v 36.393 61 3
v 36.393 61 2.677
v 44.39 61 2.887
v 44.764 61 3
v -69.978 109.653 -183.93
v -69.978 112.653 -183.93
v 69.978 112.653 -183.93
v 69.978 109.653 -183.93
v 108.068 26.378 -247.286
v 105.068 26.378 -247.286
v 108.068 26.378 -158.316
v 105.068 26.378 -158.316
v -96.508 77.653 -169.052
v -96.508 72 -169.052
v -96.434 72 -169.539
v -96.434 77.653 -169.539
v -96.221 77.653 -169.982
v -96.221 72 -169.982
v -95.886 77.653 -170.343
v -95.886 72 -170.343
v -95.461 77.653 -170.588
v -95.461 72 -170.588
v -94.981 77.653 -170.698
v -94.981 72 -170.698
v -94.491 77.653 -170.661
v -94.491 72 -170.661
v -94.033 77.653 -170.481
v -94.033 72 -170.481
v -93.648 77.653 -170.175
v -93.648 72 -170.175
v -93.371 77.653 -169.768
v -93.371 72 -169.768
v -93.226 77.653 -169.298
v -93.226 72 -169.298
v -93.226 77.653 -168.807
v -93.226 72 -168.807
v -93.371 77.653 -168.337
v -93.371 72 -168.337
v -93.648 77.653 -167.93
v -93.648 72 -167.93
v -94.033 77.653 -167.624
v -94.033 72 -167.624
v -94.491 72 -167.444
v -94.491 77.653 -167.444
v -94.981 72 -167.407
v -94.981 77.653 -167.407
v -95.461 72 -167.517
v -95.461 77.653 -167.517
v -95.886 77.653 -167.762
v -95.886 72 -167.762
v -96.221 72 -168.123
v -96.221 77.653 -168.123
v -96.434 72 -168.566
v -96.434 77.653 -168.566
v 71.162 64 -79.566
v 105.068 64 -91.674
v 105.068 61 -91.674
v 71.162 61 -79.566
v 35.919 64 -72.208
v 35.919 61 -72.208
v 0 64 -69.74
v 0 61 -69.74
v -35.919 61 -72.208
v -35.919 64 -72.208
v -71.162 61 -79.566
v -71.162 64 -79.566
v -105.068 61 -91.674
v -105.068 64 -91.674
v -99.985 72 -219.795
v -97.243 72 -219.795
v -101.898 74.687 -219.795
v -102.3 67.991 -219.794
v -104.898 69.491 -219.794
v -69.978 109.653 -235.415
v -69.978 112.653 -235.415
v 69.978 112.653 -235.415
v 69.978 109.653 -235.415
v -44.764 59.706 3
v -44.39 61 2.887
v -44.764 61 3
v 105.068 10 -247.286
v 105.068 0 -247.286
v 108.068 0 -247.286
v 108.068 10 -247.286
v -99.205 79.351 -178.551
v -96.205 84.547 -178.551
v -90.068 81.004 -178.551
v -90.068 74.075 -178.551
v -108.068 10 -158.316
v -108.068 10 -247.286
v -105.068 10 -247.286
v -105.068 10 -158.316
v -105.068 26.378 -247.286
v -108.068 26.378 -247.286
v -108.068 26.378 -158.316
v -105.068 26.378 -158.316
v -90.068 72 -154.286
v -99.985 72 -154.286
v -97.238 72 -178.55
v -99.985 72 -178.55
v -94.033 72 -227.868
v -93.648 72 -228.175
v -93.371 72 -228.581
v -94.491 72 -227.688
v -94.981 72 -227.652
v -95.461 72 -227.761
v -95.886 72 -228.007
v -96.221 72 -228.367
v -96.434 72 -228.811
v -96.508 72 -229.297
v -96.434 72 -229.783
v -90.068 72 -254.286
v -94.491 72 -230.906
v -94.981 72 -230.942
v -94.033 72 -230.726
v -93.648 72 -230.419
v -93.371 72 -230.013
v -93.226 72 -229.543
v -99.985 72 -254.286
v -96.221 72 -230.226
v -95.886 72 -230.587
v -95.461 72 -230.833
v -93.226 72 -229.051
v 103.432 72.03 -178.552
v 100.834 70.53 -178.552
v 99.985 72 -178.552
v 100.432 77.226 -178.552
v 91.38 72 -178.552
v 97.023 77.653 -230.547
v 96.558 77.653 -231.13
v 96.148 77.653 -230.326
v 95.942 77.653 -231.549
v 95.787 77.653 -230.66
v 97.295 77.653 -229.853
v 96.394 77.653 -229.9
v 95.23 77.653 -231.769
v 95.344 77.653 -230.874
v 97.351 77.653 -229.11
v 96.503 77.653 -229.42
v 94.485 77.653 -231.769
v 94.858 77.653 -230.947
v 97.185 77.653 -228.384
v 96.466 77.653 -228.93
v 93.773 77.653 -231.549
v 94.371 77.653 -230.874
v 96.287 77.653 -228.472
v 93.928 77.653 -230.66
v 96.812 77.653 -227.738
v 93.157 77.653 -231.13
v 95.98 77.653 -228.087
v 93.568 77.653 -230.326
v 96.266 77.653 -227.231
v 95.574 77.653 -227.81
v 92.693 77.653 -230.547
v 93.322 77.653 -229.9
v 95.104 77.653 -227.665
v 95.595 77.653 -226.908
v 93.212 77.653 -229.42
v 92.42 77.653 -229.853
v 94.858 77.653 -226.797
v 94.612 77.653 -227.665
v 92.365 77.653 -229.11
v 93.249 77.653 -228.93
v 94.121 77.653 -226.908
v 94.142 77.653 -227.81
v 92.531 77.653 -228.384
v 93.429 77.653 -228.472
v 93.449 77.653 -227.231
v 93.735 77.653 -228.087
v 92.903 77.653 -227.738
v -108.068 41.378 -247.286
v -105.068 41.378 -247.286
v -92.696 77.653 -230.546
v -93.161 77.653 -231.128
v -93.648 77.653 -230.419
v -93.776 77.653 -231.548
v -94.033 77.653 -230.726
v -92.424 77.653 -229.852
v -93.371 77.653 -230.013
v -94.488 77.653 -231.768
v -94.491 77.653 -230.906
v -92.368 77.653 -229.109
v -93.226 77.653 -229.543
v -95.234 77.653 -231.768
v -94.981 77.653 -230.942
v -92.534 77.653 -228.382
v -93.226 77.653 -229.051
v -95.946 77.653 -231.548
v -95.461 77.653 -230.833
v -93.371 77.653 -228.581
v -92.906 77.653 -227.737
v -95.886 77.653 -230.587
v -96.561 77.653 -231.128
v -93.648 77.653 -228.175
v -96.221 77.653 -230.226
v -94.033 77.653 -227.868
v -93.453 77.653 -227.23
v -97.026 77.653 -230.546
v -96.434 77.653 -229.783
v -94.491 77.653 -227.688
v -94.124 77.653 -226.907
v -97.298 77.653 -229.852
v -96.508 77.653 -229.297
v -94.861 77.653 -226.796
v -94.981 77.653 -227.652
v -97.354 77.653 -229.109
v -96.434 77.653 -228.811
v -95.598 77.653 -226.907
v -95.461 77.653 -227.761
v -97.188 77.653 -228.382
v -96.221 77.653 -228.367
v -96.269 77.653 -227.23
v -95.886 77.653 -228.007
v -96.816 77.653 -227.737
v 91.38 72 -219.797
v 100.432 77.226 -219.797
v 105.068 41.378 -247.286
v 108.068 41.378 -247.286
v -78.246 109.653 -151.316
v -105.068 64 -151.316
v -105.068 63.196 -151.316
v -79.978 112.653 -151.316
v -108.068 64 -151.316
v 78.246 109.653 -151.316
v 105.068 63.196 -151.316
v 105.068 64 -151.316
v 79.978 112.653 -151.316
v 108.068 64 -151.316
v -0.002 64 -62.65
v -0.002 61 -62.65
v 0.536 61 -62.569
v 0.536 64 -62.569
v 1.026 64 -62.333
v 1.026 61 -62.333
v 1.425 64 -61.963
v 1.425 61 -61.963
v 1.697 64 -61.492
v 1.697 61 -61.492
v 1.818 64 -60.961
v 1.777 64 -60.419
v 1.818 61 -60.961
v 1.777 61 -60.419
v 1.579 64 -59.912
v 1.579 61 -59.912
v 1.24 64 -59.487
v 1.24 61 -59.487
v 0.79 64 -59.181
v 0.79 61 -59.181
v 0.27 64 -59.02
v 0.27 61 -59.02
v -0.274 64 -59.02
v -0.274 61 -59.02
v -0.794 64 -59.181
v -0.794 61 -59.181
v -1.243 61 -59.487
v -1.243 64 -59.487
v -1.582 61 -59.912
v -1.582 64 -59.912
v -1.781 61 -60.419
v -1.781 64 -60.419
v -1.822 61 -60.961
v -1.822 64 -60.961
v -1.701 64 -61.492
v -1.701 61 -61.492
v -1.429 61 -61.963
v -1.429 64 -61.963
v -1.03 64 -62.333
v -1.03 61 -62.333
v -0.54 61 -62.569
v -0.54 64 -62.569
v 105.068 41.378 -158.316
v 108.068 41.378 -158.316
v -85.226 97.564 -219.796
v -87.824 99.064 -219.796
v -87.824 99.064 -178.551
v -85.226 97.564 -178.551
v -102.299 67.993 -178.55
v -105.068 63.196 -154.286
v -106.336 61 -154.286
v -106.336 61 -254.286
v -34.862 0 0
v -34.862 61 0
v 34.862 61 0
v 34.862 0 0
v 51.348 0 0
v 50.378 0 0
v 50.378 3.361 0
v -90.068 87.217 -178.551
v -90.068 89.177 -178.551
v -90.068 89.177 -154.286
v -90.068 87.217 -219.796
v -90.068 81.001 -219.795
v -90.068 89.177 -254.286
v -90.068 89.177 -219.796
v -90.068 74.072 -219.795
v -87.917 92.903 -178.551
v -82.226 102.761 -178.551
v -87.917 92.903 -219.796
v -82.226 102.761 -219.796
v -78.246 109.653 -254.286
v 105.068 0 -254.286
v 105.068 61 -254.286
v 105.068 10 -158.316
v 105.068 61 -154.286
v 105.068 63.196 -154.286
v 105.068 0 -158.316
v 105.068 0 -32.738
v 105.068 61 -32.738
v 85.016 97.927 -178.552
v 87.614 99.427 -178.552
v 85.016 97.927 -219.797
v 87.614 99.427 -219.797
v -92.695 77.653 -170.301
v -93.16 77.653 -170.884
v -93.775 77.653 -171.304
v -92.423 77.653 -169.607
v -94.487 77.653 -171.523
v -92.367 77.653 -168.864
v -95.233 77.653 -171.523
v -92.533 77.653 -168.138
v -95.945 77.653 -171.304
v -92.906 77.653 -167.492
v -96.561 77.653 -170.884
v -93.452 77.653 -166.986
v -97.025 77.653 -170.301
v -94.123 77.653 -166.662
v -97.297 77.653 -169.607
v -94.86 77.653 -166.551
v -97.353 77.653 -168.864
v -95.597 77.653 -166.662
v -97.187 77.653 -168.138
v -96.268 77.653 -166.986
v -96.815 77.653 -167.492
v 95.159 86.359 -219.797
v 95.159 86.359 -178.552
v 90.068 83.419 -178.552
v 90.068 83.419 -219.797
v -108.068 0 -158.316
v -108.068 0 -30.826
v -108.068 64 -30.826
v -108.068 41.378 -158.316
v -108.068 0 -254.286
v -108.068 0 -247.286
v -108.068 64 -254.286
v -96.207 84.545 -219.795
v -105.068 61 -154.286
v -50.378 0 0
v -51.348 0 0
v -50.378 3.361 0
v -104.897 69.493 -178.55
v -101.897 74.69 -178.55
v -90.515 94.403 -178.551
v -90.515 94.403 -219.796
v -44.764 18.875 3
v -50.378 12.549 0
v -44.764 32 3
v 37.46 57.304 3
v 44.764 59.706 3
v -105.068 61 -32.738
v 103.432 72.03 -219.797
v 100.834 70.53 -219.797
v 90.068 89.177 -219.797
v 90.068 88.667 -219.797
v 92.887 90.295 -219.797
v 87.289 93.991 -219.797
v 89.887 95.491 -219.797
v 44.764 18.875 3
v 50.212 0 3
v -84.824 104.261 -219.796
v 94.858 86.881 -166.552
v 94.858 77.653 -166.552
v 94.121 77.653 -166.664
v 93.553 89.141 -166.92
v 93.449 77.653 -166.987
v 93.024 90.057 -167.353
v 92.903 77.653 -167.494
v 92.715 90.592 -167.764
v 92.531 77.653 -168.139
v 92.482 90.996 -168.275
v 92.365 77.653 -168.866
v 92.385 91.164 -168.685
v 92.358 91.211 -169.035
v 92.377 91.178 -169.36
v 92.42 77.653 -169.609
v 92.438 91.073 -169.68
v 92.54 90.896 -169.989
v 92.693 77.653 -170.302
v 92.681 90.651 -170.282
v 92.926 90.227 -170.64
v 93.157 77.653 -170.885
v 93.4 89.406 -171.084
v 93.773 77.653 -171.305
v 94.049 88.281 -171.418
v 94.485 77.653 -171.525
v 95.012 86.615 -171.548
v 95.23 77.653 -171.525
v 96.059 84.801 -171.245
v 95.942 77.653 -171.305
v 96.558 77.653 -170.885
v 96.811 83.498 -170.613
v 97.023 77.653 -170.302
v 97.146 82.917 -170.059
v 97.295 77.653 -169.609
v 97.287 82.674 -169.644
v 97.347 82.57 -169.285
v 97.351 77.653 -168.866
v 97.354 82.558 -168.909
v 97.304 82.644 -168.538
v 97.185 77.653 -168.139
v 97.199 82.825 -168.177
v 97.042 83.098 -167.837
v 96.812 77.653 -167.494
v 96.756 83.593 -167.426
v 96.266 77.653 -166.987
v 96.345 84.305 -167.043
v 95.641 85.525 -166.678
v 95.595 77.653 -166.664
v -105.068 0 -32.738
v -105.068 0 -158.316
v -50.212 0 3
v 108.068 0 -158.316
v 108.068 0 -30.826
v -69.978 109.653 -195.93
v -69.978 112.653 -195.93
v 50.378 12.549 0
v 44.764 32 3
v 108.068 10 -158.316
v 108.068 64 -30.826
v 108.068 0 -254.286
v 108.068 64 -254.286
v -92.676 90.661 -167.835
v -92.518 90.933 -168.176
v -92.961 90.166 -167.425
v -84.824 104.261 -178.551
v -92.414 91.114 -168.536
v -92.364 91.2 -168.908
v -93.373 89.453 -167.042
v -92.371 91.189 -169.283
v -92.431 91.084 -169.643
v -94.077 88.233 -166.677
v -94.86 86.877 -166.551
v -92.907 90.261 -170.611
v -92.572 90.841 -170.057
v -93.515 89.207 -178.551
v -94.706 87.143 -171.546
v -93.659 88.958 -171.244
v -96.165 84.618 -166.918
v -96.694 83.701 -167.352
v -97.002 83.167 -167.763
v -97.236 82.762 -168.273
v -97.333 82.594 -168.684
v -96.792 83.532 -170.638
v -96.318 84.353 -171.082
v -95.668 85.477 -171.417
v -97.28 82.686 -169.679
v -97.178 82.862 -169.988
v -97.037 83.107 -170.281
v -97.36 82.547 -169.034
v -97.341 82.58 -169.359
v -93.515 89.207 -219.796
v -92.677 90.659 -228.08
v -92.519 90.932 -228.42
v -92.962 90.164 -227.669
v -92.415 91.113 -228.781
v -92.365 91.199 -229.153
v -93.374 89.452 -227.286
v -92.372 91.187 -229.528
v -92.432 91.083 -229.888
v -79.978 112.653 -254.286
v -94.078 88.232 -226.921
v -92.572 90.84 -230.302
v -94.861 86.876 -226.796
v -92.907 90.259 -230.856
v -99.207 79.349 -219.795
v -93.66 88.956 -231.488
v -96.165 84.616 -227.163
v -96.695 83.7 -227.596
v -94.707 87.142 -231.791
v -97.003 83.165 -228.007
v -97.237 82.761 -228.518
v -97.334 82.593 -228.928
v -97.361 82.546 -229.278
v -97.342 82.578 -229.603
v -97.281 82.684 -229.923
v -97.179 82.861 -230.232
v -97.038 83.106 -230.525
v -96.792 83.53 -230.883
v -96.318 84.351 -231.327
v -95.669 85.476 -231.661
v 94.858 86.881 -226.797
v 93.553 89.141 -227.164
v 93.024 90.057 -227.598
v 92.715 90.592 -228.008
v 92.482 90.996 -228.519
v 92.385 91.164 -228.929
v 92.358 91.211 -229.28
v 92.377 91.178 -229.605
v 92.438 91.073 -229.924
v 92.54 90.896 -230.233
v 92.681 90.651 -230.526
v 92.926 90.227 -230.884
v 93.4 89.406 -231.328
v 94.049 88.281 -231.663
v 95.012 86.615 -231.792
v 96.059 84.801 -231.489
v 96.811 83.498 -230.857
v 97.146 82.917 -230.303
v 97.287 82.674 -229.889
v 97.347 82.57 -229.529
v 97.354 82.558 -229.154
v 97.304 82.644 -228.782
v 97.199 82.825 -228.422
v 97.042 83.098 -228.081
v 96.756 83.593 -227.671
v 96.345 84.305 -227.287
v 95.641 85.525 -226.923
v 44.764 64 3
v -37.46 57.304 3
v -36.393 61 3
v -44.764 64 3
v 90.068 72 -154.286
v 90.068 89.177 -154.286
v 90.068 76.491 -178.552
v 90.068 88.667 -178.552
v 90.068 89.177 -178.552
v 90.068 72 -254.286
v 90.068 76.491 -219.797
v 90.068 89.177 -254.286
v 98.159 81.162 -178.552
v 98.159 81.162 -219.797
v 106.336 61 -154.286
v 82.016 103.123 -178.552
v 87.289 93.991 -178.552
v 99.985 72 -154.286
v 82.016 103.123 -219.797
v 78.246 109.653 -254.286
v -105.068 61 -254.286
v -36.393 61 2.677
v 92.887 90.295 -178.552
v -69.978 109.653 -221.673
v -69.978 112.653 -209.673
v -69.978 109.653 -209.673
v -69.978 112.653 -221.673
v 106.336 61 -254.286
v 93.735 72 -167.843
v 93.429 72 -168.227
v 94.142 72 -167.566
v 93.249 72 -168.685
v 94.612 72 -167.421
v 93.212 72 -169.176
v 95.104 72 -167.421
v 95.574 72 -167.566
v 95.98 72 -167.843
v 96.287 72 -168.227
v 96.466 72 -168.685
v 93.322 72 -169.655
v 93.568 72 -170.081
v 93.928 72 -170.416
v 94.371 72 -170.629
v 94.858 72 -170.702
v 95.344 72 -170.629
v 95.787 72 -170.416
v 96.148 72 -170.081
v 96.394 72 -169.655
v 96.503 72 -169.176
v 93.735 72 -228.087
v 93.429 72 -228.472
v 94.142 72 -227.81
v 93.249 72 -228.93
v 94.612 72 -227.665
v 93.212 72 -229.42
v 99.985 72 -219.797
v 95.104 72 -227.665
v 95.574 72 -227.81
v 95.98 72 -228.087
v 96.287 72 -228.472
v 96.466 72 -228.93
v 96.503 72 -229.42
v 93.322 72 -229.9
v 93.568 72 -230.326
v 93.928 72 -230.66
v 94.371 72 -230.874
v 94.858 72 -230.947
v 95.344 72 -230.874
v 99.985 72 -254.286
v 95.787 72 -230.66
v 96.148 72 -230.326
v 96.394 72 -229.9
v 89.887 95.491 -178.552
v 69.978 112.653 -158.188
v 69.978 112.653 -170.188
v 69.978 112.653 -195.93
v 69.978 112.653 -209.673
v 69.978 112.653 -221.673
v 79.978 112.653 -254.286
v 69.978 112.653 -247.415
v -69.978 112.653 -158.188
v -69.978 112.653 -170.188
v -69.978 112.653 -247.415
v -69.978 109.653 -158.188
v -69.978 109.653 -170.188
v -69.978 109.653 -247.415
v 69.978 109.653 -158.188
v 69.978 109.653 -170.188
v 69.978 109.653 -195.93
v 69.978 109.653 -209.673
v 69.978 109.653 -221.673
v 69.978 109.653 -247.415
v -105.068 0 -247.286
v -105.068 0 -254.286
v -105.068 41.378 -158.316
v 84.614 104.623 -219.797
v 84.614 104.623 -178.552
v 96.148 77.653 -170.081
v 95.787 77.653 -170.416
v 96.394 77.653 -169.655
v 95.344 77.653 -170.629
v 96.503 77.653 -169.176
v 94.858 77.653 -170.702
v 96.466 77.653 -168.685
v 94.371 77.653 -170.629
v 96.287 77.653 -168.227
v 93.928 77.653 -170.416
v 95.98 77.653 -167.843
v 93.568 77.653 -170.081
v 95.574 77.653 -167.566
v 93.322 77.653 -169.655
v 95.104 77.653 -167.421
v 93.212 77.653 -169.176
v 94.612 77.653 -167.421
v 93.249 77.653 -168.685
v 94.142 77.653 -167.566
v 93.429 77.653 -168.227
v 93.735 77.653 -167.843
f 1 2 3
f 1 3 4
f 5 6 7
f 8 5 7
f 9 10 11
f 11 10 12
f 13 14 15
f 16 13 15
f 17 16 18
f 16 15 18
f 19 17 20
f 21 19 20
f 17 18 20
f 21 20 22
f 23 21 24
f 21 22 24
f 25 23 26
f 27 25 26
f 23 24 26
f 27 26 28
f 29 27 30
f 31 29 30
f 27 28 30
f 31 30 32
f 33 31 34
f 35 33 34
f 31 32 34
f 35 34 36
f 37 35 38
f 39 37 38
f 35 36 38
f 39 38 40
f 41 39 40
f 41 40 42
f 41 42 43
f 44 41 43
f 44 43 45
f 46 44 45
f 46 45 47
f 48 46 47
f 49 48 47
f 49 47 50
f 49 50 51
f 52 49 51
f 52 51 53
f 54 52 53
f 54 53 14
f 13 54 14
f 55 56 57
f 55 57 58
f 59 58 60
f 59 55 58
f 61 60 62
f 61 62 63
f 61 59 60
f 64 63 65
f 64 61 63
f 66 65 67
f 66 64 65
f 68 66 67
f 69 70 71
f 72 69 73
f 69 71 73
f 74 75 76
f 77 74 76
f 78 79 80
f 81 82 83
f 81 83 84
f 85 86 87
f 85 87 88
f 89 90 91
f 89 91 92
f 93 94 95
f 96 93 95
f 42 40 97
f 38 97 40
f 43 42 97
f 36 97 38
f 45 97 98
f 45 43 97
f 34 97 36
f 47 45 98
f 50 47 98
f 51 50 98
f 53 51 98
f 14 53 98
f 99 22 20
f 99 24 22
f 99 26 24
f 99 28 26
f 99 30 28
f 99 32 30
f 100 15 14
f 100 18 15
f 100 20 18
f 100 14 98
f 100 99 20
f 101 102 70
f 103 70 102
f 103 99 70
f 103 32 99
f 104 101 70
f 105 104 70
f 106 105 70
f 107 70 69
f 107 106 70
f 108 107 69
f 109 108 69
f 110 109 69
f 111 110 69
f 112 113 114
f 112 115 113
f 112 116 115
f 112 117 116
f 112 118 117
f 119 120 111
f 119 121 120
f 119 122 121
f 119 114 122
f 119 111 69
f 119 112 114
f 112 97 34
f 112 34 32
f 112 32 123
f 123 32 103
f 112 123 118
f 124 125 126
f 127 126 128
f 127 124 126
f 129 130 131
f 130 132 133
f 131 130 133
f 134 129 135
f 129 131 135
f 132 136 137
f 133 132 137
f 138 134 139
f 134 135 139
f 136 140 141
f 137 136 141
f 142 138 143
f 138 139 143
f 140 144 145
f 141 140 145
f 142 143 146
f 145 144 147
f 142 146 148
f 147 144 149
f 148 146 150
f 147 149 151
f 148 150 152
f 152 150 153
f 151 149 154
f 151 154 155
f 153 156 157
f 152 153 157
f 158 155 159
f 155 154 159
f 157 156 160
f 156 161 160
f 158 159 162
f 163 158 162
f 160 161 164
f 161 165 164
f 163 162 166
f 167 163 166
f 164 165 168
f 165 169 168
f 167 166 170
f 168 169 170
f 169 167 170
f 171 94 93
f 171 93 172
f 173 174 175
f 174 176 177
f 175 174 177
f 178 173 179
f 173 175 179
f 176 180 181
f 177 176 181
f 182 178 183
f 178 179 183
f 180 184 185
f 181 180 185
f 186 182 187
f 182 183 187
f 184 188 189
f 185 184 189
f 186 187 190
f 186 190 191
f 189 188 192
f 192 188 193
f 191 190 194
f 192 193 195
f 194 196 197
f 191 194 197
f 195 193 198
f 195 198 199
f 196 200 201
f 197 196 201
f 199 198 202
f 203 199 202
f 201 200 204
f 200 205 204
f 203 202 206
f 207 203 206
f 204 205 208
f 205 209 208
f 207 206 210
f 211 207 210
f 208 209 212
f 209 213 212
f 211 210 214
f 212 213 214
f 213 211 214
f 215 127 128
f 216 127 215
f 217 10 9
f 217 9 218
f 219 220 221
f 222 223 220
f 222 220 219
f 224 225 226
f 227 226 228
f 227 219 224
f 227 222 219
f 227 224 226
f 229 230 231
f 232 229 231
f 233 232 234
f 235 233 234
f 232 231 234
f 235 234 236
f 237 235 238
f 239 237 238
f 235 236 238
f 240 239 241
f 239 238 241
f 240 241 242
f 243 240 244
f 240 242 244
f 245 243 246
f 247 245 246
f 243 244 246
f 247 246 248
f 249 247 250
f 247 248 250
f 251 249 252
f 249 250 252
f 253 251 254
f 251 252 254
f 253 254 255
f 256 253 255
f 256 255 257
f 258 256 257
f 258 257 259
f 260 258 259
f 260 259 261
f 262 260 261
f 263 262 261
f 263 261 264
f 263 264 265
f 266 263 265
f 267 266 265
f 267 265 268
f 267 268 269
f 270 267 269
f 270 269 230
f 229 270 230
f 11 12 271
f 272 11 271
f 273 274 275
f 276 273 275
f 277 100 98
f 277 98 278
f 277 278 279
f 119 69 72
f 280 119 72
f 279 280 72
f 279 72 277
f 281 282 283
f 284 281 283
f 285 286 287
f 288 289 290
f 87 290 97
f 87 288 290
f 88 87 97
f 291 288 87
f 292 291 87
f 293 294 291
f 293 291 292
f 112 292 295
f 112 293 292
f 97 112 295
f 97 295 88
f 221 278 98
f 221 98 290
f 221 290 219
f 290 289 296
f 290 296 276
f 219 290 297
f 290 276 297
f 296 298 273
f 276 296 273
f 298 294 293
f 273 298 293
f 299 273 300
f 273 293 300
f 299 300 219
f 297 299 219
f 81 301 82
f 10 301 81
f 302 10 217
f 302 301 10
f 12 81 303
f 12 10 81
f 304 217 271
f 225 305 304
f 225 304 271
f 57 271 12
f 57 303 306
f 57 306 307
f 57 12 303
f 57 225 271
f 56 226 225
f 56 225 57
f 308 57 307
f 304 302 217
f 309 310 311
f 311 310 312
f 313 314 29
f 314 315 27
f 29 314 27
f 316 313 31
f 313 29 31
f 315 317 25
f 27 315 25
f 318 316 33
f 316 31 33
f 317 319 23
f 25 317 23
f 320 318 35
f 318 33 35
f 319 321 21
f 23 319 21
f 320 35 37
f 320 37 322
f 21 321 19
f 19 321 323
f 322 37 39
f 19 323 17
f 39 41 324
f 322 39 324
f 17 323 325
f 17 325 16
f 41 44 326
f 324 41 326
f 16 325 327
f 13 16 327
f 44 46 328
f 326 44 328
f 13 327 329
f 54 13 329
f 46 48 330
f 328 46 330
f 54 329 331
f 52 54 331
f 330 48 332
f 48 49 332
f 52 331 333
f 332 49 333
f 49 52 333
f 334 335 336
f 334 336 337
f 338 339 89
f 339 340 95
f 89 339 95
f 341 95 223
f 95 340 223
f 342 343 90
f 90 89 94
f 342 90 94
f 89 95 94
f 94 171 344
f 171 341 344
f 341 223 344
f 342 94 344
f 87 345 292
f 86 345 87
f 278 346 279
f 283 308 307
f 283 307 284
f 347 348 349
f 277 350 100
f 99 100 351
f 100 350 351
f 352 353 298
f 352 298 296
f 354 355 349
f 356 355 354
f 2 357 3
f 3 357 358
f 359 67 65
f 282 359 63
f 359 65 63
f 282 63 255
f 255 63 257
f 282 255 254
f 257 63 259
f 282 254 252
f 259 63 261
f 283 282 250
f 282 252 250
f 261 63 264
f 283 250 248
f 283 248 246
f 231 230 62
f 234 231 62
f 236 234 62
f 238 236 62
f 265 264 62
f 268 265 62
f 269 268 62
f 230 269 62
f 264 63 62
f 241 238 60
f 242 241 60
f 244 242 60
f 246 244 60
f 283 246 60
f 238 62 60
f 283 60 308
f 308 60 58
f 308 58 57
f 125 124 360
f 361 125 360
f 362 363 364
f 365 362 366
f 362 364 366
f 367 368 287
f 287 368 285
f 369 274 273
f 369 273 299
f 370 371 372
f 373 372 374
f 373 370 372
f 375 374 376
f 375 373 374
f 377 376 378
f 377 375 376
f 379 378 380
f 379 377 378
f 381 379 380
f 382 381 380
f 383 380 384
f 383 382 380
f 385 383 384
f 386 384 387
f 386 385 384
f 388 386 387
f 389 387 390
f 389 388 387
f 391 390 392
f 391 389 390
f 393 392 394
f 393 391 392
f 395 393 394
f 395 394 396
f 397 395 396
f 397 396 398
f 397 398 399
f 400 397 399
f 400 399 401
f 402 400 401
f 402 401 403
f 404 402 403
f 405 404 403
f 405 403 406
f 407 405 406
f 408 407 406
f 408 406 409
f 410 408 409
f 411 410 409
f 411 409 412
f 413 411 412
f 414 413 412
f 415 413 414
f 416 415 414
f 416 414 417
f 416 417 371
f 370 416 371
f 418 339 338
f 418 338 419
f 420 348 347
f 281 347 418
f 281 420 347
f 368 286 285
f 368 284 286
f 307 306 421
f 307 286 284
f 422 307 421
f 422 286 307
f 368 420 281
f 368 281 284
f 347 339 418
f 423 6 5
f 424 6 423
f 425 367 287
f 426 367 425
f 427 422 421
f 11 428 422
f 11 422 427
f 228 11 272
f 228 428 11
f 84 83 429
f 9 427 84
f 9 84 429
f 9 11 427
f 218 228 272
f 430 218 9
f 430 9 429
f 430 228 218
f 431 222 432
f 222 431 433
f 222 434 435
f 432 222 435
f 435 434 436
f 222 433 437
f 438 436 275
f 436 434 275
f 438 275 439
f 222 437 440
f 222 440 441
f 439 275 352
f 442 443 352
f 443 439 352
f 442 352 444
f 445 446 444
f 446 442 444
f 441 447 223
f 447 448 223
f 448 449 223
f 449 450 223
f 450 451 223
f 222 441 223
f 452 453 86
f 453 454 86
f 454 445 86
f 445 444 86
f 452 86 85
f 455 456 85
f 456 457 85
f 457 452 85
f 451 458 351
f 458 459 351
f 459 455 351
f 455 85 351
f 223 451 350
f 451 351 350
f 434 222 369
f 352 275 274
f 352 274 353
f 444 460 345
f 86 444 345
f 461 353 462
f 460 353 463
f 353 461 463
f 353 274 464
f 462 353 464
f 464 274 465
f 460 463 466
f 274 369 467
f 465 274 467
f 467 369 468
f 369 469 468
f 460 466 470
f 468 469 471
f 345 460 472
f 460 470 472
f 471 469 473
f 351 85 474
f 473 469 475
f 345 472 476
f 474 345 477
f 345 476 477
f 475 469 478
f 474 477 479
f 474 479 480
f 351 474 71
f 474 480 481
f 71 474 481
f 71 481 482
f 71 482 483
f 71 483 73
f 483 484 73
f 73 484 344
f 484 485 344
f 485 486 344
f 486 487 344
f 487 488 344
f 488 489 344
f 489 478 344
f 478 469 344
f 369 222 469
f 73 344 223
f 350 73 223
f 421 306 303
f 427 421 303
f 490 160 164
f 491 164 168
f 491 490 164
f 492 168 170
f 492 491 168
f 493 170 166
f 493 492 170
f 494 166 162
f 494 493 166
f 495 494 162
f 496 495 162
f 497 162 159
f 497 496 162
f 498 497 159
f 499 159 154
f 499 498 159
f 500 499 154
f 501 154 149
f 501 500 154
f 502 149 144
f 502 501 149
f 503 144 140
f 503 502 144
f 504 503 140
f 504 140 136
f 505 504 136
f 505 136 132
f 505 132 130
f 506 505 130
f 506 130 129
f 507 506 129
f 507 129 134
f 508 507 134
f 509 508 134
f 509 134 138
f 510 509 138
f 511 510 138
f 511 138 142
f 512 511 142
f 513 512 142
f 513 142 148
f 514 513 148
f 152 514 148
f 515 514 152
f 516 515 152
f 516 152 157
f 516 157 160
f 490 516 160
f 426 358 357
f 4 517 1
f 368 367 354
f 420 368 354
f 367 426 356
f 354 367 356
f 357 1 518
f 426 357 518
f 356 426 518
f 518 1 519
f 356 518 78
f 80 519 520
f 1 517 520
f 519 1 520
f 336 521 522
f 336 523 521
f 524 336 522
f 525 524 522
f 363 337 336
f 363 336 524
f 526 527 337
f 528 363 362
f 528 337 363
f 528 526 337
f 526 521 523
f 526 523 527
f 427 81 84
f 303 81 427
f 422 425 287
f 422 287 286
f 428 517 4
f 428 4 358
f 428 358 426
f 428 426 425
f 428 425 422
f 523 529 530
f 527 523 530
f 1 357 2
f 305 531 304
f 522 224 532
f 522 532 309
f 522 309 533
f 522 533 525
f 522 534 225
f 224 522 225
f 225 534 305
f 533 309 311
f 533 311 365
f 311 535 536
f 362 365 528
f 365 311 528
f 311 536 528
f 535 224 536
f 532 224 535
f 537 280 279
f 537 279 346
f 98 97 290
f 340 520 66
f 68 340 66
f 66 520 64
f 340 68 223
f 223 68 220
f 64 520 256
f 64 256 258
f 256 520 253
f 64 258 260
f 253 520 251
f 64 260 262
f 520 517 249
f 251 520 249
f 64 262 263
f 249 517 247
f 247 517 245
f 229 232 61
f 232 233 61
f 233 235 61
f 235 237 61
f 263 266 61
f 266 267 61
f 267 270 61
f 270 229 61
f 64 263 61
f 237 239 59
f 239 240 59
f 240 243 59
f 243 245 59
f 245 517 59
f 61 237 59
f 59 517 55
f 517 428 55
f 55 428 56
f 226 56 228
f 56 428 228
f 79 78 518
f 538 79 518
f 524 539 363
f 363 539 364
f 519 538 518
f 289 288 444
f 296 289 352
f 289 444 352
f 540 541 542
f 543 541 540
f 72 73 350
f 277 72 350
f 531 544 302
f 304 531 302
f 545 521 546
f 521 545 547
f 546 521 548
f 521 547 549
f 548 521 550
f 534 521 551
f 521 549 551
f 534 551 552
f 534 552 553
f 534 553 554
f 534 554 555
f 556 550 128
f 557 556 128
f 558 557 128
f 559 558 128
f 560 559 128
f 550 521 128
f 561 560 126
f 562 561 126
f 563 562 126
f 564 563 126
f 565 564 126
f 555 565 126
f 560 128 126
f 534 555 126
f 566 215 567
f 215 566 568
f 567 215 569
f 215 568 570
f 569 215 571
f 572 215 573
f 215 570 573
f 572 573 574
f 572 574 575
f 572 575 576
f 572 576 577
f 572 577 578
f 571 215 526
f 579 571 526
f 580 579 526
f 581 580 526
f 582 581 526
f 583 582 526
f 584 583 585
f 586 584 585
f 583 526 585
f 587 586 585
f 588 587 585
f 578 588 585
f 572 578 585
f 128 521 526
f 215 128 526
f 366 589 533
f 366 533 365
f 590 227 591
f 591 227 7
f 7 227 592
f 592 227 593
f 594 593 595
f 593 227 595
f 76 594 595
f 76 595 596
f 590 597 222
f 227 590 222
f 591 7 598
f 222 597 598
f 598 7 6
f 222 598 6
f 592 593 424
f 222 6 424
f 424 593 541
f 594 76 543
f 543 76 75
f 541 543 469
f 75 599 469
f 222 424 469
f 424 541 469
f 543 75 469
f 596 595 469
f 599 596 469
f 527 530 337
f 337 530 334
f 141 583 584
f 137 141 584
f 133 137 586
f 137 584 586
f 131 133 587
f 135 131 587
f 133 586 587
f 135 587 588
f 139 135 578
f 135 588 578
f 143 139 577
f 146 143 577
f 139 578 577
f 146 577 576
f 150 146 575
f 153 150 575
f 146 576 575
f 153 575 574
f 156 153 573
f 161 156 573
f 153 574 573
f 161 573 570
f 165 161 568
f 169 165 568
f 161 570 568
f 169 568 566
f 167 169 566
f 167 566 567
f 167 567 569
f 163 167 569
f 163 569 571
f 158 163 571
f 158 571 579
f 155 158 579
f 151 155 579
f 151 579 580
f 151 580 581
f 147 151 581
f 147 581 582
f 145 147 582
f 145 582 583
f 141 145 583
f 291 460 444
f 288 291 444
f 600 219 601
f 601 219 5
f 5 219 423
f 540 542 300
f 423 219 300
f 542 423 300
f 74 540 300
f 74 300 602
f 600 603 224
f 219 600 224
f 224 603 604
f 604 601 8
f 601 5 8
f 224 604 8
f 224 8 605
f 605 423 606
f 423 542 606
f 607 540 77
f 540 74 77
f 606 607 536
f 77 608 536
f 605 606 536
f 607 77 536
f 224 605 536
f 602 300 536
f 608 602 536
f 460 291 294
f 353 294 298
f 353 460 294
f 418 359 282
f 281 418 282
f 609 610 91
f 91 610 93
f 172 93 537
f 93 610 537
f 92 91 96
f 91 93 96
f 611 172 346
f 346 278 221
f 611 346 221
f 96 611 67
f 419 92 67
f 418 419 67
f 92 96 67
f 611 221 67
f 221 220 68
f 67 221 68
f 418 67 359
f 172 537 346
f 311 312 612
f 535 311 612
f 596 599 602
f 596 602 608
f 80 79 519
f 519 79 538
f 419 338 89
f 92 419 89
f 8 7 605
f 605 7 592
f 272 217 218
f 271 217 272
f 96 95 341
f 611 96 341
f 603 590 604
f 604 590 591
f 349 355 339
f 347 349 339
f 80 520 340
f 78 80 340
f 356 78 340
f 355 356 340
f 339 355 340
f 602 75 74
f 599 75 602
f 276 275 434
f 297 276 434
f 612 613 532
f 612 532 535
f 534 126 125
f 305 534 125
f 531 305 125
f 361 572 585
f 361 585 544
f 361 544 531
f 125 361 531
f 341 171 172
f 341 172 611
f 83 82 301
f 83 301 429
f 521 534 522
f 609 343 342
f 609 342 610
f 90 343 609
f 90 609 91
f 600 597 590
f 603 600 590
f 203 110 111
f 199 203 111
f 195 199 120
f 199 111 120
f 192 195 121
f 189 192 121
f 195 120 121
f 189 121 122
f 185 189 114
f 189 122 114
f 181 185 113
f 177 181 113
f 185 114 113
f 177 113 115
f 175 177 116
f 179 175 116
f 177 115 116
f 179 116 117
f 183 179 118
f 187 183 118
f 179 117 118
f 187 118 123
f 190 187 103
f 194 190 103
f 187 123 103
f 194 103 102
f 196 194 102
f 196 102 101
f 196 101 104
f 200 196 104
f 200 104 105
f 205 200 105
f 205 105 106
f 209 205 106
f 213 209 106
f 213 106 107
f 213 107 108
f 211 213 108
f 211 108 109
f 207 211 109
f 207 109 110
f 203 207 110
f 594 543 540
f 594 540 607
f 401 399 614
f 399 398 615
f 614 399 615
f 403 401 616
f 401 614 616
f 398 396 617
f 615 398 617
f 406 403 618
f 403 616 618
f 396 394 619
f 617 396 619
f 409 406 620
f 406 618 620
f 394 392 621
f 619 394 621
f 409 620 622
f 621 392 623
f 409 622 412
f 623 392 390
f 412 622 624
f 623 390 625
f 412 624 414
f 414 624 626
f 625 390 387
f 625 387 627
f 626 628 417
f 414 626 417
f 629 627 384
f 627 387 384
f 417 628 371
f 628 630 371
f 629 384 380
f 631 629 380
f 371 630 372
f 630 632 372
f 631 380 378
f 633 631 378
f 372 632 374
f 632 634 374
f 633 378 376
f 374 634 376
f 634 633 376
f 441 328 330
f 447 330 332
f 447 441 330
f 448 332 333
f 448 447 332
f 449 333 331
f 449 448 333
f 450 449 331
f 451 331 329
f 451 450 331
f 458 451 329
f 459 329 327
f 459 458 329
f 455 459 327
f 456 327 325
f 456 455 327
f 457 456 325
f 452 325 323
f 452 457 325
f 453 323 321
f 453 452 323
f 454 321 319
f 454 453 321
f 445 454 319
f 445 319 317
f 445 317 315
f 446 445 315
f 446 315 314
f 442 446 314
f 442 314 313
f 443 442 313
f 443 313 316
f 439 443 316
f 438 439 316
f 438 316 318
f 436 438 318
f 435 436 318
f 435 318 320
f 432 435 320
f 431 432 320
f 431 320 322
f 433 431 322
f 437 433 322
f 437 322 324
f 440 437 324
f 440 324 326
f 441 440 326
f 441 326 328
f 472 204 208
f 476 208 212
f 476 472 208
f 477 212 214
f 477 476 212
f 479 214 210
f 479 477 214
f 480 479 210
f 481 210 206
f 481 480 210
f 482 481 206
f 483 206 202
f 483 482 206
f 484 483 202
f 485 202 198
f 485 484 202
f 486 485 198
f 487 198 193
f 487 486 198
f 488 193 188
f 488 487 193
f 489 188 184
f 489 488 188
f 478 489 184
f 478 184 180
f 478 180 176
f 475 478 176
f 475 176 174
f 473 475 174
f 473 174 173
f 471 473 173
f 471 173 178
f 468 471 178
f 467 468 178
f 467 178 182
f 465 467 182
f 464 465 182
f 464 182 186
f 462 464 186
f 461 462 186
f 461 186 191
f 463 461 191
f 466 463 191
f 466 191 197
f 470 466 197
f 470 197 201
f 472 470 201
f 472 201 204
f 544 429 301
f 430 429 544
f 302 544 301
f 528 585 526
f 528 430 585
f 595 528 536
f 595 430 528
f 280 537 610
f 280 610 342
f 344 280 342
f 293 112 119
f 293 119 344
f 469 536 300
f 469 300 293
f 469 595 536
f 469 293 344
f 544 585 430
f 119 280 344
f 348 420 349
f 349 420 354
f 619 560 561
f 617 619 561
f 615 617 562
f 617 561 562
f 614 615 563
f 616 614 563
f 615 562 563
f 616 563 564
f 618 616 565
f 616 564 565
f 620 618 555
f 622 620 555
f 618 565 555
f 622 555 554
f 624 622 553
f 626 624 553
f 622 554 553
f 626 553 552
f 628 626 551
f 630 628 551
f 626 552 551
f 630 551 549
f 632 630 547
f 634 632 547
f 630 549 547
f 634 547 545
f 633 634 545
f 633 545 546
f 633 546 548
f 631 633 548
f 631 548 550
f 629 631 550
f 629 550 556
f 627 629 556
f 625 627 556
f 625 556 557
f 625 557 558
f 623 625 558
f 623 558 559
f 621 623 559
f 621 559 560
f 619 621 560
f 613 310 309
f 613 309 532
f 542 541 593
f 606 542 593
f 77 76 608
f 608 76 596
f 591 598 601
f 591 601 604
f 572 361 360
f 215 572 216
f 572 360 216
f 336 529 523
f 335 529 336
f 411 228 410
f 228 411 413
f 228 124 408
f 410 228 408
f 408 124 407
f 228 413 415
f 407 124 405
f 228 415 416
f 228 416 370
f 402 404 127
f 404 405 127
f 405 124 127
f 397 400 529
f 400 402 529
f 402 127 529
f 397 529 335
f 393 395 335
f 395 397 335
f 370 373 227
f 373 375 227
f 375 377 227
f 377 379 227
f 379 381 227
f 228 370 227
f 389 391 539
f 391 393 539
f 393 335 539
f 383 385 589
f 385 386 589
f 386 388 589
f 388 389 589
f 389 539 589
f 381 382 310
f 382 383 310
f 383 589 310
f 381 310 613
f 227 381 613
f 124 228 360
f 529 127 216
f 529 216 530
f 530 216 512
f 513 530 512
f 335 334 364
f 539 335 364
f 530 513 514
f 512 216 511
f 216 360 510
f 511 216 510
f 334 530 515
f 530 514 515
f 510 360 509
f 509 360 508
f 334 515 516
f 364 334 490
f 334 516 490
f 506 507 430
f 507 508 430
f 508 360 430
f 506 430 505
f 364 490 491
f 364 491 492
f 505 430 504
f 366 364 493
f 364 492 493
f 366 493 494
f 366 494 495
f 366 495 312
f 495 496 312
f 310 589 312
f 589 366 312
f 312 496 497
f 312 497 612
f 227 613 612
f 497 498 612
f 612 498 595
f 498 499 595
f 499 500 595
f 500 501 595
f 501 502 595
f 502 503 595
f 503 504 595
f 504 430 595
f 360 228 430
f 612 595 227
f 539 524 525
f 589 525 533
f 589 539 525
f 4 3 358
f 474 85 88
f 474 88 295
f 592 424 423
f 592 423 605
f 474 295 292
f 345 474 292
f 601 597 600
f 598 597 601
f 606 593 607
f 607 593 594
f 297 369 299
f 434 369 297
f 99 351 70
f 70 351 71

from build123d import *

# Parameters (mm, degrees)
SALIENTE_EXTRUIR15_DEPTH = 3
SALIENTE_EXTRUIR16_REACH = 85.791
CHAFL_N1_SIZE            = 8
CHAFL_N1_SIZE_2          = 2.205109306
CHAFL_N2_SIZE            = 2.205109306
CHAFL_N2_SIZE_2          = 8
SALIENTE_EXTRUIR17_DEPTH = 3
SALIENTE_EXTRUIR18_DEPTH = 102.97
CROQUIS28_R              = 1.825
CORTAR_EXTRUIR6_DEPTH    = 283.951050372
SALIENTE_EXTRUIR19_DEPTH = 100
CROQUIS30_R              = 1.65
CORTAR_EXTRUIR7_DEPTH    = 283.951050372
CORTAR_EXTRUIR9_REACH    = 302.941
CORTAR_EXTRUIR10_START   = -40.653307
CROQUIS34_R              = 2.5
CORTAR_EXTRUIR10_DEPTH   = 35
CROQUIS35_W              = 41.244426213
CROQUIS35_H              = 6
CORTAR_EXTRUIR11_DEPTH   = 17
CROQUIS36_W              = 41.244426207
CROQUIS36_H              = 6
CORTAR_EXTRUIR12_DEPTH   = 17
CROQUIS37_W              = 139.956448948
CROQUIS37_H              = 12
CORTAR_EXTRUIR13_DEPTH   = 3
CROQUIS39_W              = 88.97
CROQUIS39_H              = 15
CROQUIS39_H_2            = 10
CORTAR_EXTRUIR14_DEPTH   = 353.231866742
CHAFL_N4_SIZE            = 3.639702343
CHAFL_N4_SIZE_2          = 10


with BuildPart() as part:
    # Croquis22 → Saliente-Extruir15 (new body)
    with BuildSketch(Plane.XY):
        Polygon((-54, 0), (54, 0), (35.527349199, 64), (-35.527349199, 64), align=None)
    extrude(amount=SALIENTE_EXTRUIR15_DEPTH)

    # Saliente-Extruir16: up to this face of the body (flat: up to its plane)
    saliente_extruir16_end = Plane(part.part.faces().sort_by_distance((0, 0, 1.5))[0])
    # Croquis23 → Saliente-Extruir16 (add, up to the picked face)
    with BuildSketch(Plane(origin=(0, 64, 0), x_dir=(1, 0, 0), z_dir=(0, 1, 0)), mode=Mode.PRIVATE) as saliente_extruir16_sk1:
        Polygon((108.068224474, 30.82636567), (108.068224474, 254.28636567), (105.068224474, 254.28636567), (105.068224474, 32.737576452), (34.862265211, 0), (44.7636746, -3), align=None)
    saliente_extruir16_tool1 = split(extrude(saliente_extruir16_sk1.sketch, amount=-SALIENTE_EXTRUIR16_REACH, mode=Mode.PRIVATE), bisect_by=saliente_extruir16_end, keep=Keep.BOTH, mode=Mode.PRIVATE)
    # Croquis23 → Saliente-Extruir16 (add, up to the picked face)
    with BuildSketch(Plane(origin=(0, 64, 0), x_dir=(1, 0, 0), z_dir=(0, 1, 0)), mode=Mode.PRIVATE) as saliente_extruir16_sk2:
        Polygon((-44.7636746, -3), (-108.068224474, 30.82636567), (-108.068224474, 254.28636567), (-105.068224474, 254.28636567), (-105.068224474, 32.737576452), (-34.862265211, 0), align=None)
    saliente_extruir16_tool2 = split(extrude(saliente_extruir16_sk2.sketch, amount=-SALIENTE_EXTRUIR16_REACH, mode=Mode.PRIVATE), bisect_by=saliente_extruir16_end, keep=Keep.BOTH, mode=Mode.PRIVATE)
    add(saliente_extruir16_tool1.solids().sort_by(Axis((105.393241, 64, -142.556366), (0, -1, 0)))[0])
    add(saliente_extruir16_tool2.solids().sort_by(Axis((-75.155279, 64, -16.272473), (0, -1, 0)))[0])

    # Chaflán1
    # the kernel refuses this chamfer: 8, 2.205109306 mm, written as the material it adds along each edge
    with BuildSketch(Plane(origin=(-50.503325007, 12.114514694, 4.739040428), x_dir=(-0.919298302367056, 0.2887303877017334, 0.267442319917128), z_dir=(0.2763409092722936, 0.9574055388276669, -0.0837277497886264))) as chafl_n1_piece_1_section:
        Polygon((CHAFL_N1_SIZE * 0.999943641705, CHAFL_N1_SIZE * 0.0106166574103), (CHAFL_N1_SIZE_2 * 0.268384707917, CHAFL_N1_SIZE_2 * 0.963311812656), (0, 0), align=None)
    chafl_n1_piece_1 = extrude(amount=74.96402277, mode=Mode.PRIVATE)
    chafl_n1_piece_1 = split(chafl_n1_piece_1, bisect_by=Plane(origin=(-40.189826284, 64, 2.253573464), z_dir=(0, -1, 0)), keep=Keep.TOP, mode=Mode.PRIVATE)
    chafl_n1_piece_1 = split(chafl_n1_piece_1, bisect_by=Plane(origin=(-40.189826284, 55.464802275, 3), z_dir=(0, 0, -1)), keep=Keep.TOP, mode=Mode.PRIVATE)
    add(chafl_n1_piece_1)

    # Chaflán2
    # the kernel refuses this chamfer: 8, 2.205109306 mm, written as the material it adds along each edge
    with BuildSketch(Plane(origin=(50.503325007, 12.114514694, 4.739040428), x_dir=(-0.1610184044916604, 0.03976595413217484, 0.9861499593403216), z_dir=(-0.27634090927229366, 0.957405538827667, -0.08372774978862642))) as chafl_n2_piece_1_section:
        Polygon((CHAFL_N2_SIZE * 0.989624861472, CHAFL_N2_SIZE * 0.143675444677), (CHAFL_N2_SIZE_2 * 0.137719182616, CHAFL_N2_SIZE_2 * 0.990471315455), (0, 0), align=None)
    chafl_n2_piece_1 = extrude(amount=74.96402277, mode=Mode.PRIVATE)
    chafl_n2_piece_1 = split(chafl_n2_piece_1, bisect_by=Plane(origin=(40.189826284, 55.464802275, 3), z_dir=(0, 0, -1)), keep=Keep.TOP, mode=Mode.PRIVATE)
    chafl_n2_piece_1 = split(chafl_n2_piece_1, bisect_by=Plane(origin=(40.189826284, 64, 2.253573464), z_dir=(0, -1, 0)), keep=Keep.TOP, mode=Mode.PRIVATE)
    add(chafl_n2_piece_1)

    # Croquis24 → Saliente-Extruir17 (add)
    with BuildSketch(Plane(origin=(0, 64, 0), x_dir=(1, 0, 0), z_dir=(0, 1, 0))):
        with BuildLine():
            Line((-108.068224474, 93.00636567), (-108.068224474, 30.82636567))
            Line((-108.068224474, 30.82636567), (-44.7636746, -3))
            Line((-44.7636746, -3), (44.7636746, -3))
            Line((44.7636746, -3), (108.068224474, 30.82636567))
            Line((108.068224474, 30.82636567), (108.068224474, 93.00636567))
            ThreePointArc((108.068224474, 93.00636567), (0, 69.74), (-108.068224474, 93.00636567))
        make_face()
    extrude(amount=-SALIENTE_EXTRUIR17_DEPTH)

    # Croquis25 → Saliente-Extruir18 (add)
    with BuildSketch(Plane(origin=(0, 0, -254.28636567), x_dir=(-1, 0, 0), z_dir=(0, 0, -1))):
        Polygon((-108.068224474, 64), (-79.978224474, 112.653307185), (79.978224474, 112.653307185), (108.068224474, 64), (105.068224474, 63.196152423), (78.246173666, 109.653307185), (-78.246173666, 109.653307185), (-105.068224474, 63.196152423), align=None)
    extrude(amount=-SALIENTE_EXTRUIR18_DEPTH)

    # Croquis28 → Cortar-Extruir6 (cut, through all)
    with BuildSketch(Plane.XZ.offset(-61)):
        with Locations(Location((-0.001775526, -60.825, 0), (0, 0, 270))):
            Circle(CROQUIS28_R)
    extrude(amount=-CORTAR_EXTRUIR6_DEPTH, mode=Mode.SUBTRACT)

    # Croquis29 → Saliente-Extruir19 (add)
    with BuildSketch(Plane(origin=(0, 0, -254.28636567), x_dir=(-1, 0, 0), z_dir=(0, 0, -1))):
        Polygon((-105.068224474, 61), (-90.068224474, 61), (-90.068224474, 89.176914536), (-105.068224474, 63.196152423), align=None)
        Polygon((105.068224474, 61), (105.068224474, 63.196152423), (90.068224474, 89.176914536), (90.068224474, 61), align=None)
    extrude(amount=-SALIENTE_EXTRUIR19_DEPTH)

    # Croquis30 → Cortar-Extruir7 (cut, through all)
    with BuildSketch(Plane.XZ.offset(-61)):
        with Locations(Location((94.857727132, -169.052479414, 0), (0, 0, 270))):
            Circle(CROQUIS30_R)
        with Locations(Location((94.857727132, -229.296905627, 0), (0, 0, 270))):
            Circle(CROQUIS30_R)
        with Locations(Location((-94.857727132, -229.296905627, 0), (0, 0, 180))):
            Circle(CROQUIS30_R)
        with Locations(Location((-94.857727132, -169.052479414, 0), (0, 0, 180))):
            Circle(CROQUIS30_R)
    extrude(amount=-CORTAR_EXTRUIR7_DEPTH, mode=Mode.SUBTRACT)

    # Cortar-Extruir9: up to this face of the body (flat: up to its plane)
    cortar_extruir9_end = Plane(part.part.faces().sort_by_distance((95.429754053, 70.445236449, -154.28636567))[0])
    # Croquis33 → Cortar-Extruir9 (cut, up to the picked face)
    with BuildSketch(Plane(origin=(0, 0, -254.28636567), x_dir=(-1, 0, 0), z_dir=(0, 0, -1)), mode=Mode.PRIVATE) as cortar_extruir9_sk1:
        Polygon((-90.068224474, 61), (-90.068224474, 72), (-99.985320705, 72), (-106.336173666, 61), align=None)
    cortar_extruir9_tool1 = split(extrude(cortar_extruir9_sk1.sketch, amount=-CORTAR_EXTRUIR9_REACH, mode=Mode.PRIVATE), bisect_by=cortar_extruir9_end, keep=Keep.BOTH, mode=Mode.PRIVATE)
    # Croquis33 → Cortar-Extruir9 (cut, up to the picked face)
    with BuildSketch(Plane(origin=(0, 0, -254.28636567), x_dir=(-1, 0, 0), z_dir=(0, 0, -1)), mode=Mode.PRIVATE) as cortar_extruir9_sk2:
        Polygon((99.985320705, 72), (106.336173666, 61), (90.068224474, 61), (90.068224474, 72), align=None)
    cortar_extruir9_tool2 = split(extrude(cortar_extruir9_sk2.sketch, amount=-CORTAR_EXTRUIR9_REACH, mode=Mode.PRIVATE), bisect_by=cortar_extruir9_end, keep=Keep.BOTH, mode=Mode.PRIVATE)
    add(cortar_extruir9_tool1.solids().sort_by(Axis((96.742846, 66.055348, -254.286366), (0, 0, 1)))[0], mode=Mode.SUBTRACT)
    add(cortar_extruir9_tool2.solids().sort_by(Axis((-96.742846, 66.055348, -254.286366), (0, 0, 1)))[0], mode=Mode.SUBTRACT)

    # Croquis34 → Cortar-Extruir10 (cut)
    with BuildSketch(Plane.XZ.offset(-72).offset(CORTAR_EXTRUIR10_START)):
        with Locations(Location((94.857727132, -169.052479414, 0), (0, 0, 90))):
            Circle(CROQUIS34_R)
        with Locations(Location((94.857727132, -229.296905627, 0), (0, 0, 90))):
            Circle(CROQUIS34_R)
        with Locations(Location((-94.860104661, -169.05116859, 0), (0, 0, 90))):
            Circle(CROQUIS34_R)
        with Locations(Location((-94.860937159, -229.295594797, 0), (0, 0, 90))):
            Circle(CROQUIS34_R)
    extrude(amount=CORTAR_EXTRUIR10_DEPTH, mode=Mode.SUBTRACT)

    # Croquis35 → Cortar-Extruir11 (cut)
    with BuildSketch(Plane(origin=(108.763981276, 62.794913868, 0), x_dir=(0, 0, -1), z_dir=(0.8660254037844364, 0.5000000000000041, 0))):
        with Locations((199.174692521, 34.754013605)):
            Rectangle(CROQUIS35_W, CROQUIS35_H)
        with Locations((199.174692521, 45.299013605)):
            Rectangle(CROQUIS35_W, CROQUIS35_H)
        with Locations((199.174692521, 24.209013605)):
            Rectangle(CROQUIS35_W, CROQUIS35_H)
        with Locations((199.174692521, 13.664013605)):
            Rectangle(CROQUIS35_W, CROQUIS35_H)
    extrude(amount=-CORTAR_EXTRUIR11_DEPTH, mode=Mode.SUBTRACT)

    # Croquis36 → Cortar-Extruir12 (cut)
    with BuildSketch(Plane(origin=(-108.763981276, 62.794913868, 0), x_dir=(0, 0, 1), z_dir=(-0.8660254037844363, 0.500000000000004, 0))):
        with Locations((-199.173381694, 33.498068951)):
            Rectangle(CROQUIS36_W, CROQUIS36_H)
        with Locations((-199.173381694, 44.880365387)):
            Rectangle(CROQUIS36_W, CROQUIS36_H)
        Polygon((-219.795070879, 19.114529475), (-219.795432544, 25.114529465), (-178.551006411, 25.117015574), (-178.550644747, 19.117015585), align=None)
        Polygon((-219.794384783, 7.73223306), (-178.549958651, 7.734719169), (-178.550320316, 13.734719158), (-219.794746448, 13.732233049), align=None)
    extrude(amount=-CORTAR_EXTRUIR12_DEPTH, mode=Mode.SUBTRACT)

    # Croquis37 → Cortar-Extruir13 (cut)
    with BuildSketch(Plane(origin=(0, 112.653307185, 0), x_dir=(1, 0, 0), z_dir=(0, 1, 0))):
        with Locations((0, 241.41511567)):
            Rectangle(CROQUIS37_W, CROQUIS37_H)
        with Locations((0, 215.67261567)):
            Rectangle(CROQUIS37_W, CROQUIS37_H)
        with Locations((0, 189.93011567)):
            Rectangle(CROQUIS37_W, CROQUIS37_H)
        with Locations((0, 164.18761567)):
            Rectangle(CROQUIS37_W, CROQUIS37_H)
    extrude(amount=-CORTAR_EXTRUIR13_DEPTH, mode=Mode.SUBTRACT)

    # Croquis39 → Cortar-Extruir14 (cut, through all)
    with BuildSketch(Plane.ZY.offset(108.068224474)):
        with Locations((-202.80136567, 33.877807024)):
            Rectangle(CROQUIS39_W, CROQUIS39_H)
        with Locations((-202.80136567, 5)):
            Rectangle(CROQUIS39_W, CROQUIS39_H_2)
    extrude(amount=-CORTAR_EXTRUIR14_DEPTH, mode=Mode.SUBTRACT)

    # Chaflán4
    # the kernel refuses this chamfer: 10, 3.639702343 mm, written as the material it takes off along each edge
    with BuildSketch(Plane(origin=(61.194082129, -24.924482209, 3), x_dir=(-0.9560553519940534, -0.27595119786771466, 0.0990409022520496), z_dir=(-0.27731465330238175, 0.9607791541575931, 0))) as chafl_n4_piece_1_section:
        Polygon((CHAFL_N4_SIZE * 0.995083363089, -CHAFL_N4_SIZE * 0.0990409022429), (-CHAFL_N4_SIZE_2 * 0.099040902252, -CHAFL_N4_SIZE_2 * 0.995083363182), (0, 0), align=None)
    chafl_n4_piece_1 = extrude(amount=85.19019596, mode=Mode.PRIVATE)
    chafl_n4_piece_1 = split(chafl_n4_piece_1, bisect_by=Plane(origin=(49.101684897, 9.648205997, 0.682013017), z_dir=(0.47128163735993633, 0, 0.881982776638715)), keep=Keep.TOP, mode=Mode.PRIVATE)
    add(chafl_n4_piece_1, mode=Mode.SUBTRACT)
    with BuildSketch(Plane(origin=(-37.569592471, 56.924482209, 3), x_dir=(0.9560553519940533, -0.27595119786771466, 0.09904090225204958), z_dir=(-0.27731465330238175, -0.9607791541575931, 0))) as chafl_n4_piece_2_section:
        Polygon((CHAFL_N4_SIZE * 0.995083363089, -CHAFL_N4_SIZE * 0.0990409022429), (-CHAFL_N4_SIZE_2 * 0.0990409022521, -CHAFL_N4_SIZE_2 * 0.995083363182), (0, 0), align=None)
    chafl_n4_piece_2 = extrude(amount=85.19019596, mode=Mode.PRIVATE)
    chafl_n4_piece_2 = split(chafl_n4_piece_2, bisect_by=Plane(origin=(-49.101684897, 9.648205997, 0.682013017), z_dir=(-0.47128163735993633, 0, 0.881982776638715)), keep=Keep.TOP, mode=Mode.PRIVATE)
    add(chafl_n4_piece_2, mode=Mode.SUBTRACT)


solid = part.part
